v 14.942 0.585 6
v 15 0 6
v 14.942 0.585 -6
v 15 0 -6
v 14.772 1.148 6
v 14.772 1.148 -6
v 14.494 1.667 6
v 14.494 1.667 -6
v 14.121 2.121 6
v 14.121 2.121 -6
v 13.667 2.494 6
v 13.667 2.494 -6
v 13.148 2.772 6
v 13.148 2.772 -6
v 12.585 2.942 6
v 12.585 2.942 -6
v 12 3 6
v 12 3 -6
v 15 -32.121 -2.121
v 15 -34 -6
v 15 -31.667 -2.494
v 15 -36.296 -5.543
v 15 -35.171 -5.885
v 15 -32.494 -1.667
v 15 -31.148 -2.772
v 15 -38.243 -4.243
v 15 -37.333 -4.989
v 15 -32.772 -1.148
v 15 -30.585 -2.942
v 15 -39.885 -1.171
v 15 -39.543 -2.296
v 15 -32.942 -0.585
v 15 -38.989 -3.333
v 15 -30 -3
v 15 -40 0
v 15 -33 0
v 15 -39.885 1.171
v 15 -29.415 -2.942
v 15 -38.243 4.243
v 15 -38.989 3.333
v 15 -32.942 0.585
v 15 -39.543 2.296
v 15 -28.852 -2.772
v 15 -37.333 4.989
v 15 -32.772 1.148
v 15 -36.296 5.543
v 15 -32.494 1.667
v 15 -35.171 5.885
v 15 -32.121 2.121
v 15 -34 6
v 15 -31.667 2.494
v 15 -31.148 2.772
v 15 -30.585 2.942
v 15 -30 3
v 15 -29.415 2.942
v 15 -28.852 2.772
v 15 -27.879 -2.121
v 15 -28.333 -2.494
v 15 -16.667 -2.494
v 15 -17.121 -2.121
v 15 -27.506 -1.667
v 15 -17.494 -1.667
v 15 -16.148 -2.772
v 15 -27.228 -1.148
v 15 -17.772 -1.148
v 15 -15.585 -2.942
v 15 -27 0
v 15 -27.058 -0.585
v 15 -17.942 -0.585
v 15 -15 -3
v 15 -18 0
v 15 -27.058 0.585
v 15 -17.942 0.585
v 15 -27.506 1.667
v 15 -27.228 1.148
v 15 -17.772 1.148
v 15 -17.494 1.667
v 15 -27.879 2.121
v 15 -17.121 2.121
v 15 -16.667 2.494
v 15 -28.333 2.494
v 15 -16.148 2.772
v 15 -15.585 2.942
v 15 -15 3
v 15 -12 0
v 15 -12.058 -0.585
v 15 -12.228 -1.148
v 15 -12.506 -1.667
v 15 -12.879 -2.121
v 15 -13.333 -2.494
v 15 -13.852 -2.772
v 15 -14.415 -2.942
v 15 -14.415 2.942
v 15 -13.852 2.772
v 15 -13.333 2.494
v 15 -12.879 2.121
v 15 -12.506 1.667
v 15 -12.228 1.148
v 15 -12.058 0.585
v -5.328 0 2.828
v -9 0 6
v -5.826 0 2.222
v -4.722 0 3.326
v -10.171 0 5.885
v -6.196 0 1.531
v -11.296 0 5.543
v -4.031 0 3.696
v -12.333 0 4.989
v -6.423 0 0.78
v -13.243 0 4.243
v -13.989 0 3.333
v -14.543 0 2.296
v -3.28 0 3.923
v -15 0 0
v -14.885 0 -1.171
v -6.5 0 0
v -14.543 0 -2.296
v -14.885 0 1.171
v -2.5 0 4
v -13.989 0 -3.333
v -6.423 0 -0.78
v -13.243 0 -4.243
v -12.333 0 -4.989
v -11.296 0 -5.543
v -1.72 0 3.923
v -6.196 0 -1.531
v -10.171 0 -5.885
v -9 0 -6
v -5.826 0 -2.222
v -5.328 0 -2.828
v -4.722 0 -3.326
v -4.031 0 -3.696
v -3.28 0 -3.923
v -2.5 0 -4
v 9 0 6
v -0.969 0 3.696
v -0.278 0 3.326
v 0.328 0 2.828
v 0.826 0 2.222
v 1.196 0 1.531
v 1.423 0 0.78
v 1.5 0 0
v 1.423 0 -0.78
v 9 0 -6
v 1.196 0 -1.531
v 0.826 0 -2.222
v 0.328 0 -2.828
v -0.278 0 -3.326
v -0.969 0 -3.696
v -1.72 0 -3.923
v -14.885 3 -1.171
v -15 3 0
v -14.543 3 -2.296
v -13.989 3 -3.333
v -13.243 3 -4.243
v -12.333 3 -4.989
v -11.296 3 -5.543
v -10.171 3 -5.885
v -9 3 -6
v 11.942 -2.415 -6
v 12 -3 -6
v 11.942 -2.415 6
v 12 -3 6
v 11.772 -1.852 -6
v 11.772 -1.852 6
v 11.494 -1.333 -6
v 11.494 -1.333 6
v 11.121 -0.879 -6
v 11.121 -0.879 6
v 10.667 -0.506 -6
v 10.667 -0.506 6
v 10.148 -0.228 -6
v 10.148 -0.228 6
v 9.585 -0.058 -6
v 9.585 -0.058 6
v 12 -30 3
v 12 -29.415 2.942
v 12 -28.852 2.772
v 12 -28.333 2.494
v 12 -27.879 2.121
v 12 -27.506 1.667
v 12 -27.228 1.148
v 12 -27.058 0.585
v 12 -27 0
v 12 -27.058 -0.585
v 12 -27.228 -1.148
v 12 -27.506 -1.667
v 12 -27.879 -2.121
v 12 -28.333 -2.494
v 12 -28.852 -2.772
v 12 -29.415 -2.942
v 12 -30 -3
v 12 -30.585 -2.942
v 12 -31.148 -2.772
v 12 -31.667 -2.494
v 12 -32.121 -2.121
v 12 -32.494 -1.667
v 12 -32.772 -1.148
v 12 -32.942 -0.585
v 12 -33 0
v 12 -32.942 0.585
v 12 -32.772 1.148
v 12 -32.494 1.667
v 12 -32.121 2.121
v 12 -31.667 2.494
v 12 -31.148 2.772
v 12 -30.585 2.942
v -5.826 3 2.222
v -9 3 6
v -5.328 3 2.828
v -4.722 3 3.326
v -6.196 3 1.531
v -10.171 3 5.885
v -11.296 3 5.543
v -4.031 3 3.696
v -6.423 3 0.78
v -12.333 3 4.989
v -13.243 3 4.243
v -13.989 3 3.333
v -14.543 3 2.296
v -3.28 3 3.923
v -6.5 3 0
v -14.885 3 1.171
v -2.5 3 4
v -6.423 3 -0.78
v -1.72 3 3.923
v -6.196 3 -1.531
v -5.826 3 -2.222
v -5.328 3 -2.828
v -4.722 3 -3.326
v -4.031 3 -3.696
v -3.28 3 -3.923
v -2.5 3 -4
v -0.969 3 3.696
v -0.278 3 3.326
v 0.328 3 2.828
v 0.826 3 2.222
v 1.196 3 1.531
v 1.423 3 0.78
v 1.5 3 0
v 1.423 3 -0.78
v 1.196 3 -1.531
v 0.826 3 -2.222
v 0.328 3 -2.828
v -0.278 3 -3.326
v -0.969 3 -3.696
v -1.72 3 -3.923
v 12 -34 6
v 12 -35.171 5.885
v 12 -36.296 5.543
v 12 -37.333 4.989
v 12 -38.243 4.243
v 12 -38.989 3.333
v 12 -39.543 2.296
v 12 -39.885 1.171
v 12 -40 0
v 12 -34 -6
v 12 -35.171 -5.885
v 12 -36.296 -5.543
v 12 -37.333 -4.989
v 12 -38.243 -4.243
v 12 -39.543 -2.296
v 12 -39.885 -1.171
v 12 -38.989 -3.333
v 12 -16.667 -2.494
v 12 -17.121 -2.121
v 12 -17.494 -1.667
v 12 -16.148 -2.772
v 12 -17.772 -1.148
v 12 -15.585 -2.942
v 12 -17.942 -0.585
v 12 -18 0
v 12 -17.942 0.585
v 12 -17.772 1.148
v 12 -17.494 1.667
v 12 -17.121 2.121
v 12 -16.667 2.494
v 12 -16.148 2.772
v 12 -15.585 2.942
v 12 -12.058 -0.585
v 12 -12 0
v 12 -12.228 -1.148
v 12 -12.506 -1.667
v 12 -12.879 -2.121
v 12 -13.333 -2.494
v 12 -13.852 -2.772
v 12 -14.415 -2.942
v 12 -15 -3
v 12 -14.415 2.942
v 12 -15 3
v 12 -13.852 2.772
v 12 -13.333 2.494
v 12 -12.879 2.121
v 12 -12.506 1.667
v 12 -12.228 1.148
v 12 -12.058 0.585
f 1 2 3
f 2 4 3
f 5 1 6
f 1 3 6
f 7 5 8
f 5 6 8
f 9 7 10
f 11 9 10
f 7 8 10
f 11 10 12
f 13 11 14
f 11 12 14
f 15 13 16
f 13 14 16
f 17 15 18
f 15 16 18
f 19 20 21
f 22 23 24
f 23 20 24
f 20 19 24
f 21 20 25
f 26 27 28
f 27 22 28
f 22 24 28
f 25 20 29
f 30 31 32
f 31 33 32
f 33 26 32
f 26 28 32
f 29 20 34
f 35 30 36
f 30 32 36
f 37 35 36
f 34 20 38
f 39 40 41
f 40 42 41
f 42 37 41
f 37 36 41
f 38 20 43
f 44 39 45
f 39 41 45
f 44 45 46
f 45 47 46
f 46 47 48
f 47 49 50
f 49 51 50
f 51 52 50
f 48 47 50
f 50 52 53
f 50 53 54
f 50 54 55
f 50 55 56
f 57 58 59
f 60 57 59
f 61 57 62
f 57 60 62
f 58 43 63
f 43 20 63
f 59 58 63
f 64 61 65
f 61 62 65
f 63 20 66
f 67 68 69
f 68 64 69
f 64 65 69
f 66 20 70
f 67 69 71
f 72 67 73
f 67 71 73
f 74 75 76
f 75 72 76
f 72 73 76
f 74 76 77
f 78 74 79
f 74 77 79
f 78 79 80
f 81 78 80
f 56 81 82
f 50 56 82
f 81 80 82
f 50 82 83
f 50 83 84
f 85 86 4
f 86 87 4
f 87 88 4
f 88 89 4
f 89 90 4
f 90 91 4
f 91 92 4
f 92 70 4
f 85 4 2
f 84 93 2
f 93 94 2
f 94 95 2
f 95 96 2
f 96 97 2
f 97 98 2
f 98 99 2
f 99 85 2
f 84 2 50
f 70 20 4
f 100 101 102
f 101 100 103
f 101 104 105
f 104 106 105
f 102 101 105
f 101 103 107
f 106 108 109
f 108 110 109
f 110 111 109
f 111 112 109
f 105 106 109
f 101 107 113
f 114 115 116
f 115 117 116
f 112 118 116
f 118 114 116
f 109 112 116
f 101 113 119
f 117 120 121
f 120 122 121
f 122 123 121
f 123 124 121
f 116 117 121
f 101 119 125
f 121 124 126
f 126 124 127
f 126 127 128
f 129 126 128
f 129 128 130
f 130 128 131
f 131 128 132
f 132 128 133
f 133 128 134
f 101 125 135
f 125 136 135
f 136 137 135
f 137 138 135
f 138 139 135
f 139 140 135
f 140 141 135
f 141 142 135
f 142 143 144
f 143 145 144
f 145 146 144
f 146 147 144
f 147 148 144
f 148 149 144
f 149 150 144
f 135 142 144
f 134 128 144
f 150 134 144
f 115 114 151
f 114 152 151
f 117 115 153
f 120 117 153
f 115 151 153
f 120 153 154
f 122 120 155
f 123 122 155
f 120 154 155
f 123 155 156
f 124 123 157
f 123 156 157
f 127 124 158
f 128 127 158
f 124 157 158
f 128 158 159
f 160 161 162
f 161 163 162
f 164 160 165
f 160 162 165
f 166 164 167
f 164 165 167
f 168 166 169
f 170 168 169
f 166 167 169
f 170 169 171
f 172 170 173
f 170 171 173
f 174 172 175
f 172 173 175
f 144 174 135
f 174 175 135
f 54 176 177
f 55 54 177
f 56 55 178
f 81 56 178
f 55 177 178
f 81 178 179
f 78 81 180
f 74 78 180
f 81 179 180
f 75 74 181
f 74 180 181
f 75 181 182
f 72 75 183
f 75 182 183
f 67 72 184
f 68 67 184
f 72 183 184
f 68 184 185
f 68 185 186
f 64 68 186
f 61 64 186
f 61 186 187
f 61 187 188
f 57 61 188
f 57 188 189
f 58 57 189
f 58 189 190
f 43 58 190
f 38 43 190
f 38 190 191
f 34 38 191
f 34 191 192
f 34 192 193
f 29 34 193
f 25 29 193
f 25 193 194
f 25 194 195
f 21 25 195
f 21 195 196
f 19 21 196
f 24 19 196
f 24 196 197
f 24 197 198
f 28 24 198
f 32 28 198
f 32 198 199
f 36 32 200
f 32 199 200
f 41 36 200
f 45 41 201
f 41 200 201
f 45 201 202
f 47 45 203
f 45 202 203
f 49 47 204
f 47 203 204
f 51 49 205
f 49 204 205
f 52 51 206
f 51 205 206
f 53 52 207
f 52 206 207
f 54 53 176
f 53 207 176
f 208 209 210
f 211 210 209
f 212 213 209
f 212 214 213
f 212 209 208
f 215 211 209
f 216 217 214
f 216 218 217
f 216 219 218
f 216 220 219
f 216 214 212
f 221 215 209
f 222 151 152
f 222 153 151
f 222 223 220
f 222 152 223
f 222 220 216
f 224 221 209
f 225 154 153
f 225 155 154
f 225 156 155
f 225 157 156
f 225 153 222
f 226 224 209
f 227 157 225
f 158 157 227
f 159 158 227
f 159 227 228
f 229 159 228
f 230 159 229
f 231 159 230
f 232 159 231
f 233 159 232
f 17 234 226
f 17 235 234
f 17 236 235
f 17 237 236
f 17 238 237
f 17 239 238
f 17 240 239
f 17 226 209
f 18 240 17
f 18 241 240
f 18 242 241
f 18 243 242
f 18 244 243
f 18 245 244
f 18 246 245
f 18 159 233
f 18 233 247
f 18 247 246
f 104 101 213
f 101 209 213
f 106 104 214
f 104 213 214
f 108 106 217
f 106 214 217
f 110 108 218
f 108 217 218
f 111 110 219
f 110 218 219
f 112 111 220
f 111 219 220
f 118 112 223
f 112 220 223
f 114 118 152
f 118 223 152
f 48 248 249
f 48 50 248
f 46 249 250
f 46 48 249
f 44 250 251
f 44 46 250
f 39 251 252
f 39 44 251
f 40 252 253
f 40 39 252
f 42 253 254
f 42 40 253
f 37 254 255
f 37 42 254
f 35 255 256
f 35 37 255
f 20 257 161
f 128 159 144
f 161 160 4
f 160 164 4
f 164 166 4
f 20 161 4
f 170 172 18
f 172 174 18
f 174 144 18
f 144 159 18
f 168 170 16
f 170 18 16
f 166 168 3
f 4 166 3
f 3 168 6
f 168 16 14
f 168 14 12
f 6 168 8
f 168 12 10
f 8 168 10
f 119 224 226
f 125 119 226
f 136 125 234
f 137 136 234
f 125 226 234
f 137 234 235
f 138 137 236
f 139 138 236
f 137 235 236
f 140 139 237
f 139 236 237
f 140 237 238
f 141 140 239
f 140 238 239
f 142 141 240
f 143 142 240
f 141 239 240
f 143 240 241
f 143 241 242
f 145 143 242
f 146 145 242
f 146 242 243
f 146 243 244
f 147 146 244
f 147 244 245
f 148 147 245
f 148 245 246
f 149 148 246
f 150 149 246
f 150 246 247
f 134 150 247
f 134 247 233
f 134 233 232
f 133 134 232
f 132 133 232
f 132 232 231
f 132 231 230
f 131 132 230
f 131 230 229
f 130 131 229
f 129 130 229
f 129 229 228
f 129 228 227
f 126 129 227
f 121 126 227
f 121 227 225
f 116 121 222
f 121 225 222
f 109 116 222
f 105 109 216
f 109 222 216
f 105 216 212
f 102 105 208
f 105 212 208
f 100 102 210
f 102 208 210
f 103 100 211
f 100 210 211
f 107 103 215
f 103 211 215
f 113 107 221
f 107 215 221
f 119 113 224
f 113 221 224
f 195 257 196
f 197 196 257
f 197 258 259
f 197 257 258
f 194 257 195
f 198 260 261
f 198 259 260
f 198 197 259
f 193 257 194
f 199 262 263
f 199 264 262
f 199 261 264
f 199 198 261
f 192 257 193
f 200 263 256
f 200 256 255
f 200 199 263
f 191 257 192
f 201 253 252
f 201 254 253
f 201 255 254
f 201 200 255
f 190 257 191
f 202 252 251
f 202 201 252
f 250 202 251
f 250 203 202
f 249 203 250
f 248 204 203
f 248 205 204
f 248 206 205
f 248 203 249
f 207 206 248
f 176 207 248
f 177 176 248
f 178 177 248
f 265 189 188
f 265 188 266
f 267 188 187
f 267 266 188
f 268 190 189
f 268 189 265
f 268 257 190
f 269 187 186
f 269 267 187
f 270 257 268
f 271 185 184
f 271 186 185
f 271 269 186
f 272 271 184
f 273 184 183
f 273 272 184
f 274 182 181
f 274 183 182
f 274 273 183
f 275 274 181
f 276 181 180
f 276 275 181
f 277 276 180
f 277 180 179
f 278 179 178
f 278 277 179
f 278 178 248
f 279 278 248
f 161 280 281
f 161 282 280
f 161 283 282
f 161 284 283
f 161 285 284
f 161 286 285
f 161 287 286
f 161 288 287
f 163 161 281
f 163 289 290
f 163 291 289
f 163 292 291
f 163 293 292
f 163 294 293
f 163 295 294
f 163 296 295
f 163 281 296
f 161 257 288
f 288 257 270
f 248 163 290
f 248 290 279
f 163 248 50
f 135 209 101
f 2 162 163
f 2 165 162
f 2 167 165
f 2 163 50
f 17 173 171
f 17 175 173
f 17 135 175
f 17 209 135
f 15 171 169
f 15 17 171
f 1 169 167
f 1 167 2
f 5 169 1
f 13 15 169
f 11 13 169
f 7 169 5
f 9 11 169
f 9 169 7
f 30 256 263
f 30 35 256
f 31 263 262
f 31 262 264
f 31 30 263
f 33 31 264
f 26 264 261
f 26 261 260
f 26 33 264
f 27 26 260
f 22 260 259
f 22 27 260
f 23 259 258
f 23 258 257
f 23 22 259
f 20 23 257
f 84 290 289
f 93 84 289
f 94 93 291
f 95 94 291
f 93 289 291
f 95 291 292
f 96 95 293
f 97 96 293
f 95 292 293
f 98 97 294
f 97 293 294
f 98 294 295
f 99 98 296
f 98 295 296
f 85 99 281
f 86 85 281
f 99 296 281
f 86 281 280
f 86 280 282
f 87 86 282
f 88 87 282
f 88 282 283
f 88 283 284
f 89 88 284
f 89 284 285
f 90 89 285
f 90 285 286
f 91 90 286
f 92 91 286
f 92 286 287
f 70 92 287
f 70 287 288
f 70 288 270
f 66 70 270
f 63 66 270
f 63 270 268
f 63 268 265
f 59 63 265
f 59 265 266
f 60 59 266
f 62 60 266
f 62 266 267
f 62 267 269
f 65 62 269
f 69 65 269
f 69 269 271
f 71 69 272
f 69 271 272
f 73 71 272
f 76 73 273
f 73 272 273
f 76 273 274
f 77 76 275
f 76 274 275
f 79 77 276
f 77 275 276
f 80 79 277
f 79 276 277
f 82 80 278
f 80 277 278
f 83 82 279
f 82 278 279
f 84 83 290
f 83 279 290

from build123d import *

# Parameters (mm, degrees)
SKETCH1_W           = 30
SKETCH1_H           = 12
BOSS_EXTRUDE1_DEPTH = 3
SKETCH2_W           = 3
SKETCH2_H           = 12
BOSS_EXTRUDE2_DEPTH = 40
FILLET1_R           = 3
FILLET2_R           = 3
SKETCH3_R           = 4
CUT_EXTRUDE1_DEPTH  = 40
SKETCH4_R           = 3
CUT_EXTRUDE3_DEPTH  = 49.631265663
FILLET3_R           = 6
FILLET4_R           = 6


with BuildPart() as part:
    # Sketch1 → Boss-Extrude1 (new body)
    with BuildSketch(Plane(origin=(0, 0, 0), x_dir=(1, 0, 0), z_dir=(0, 1, 0))):
        Rectangle(SKETCH1_W, SKETCH1_H)
    extrude(amount=BOSS_EXTRUDE1_DEPTH)

    # Sketch2 → Boss-Extrude2 (add)
    with BuildSketch(Plane.XZ):
        with Locations((13.5, 0)):
            Rectangle(SKETCH2_W, SKETCH2_H)
    extrude(amount=BOSS_EXTRUDE2_DEPTH)

    # Fillet1
    fillet1_edges = [part.edges().sort_by_distance(p)[0] for p in [
        (15, 3, 0),
    ]]
    fillet(fillet1_edges, radius=FILLET1_R)

    # Fillet2
    fillet2_edges = [part.edges().sort_by_distance(p)[0] for p in [
        (12, 0, 0),
    ]]
    fillet(fillet2_edges, radius=FILLET2_R)

    # Sketch3 → Cut-Extrude1 (cut)
    with BuildSketch(Plane(origin=(0, 3, 0), x_dir=(1, 0, 0), z_dir=(0, 1, 0))):
        with Locations(Location((-2.5, 0, 0), (0, 0, 270))):
            Circle(SKETCH3_R)
    extrude(amount=-CUT_EXTRUDE1_DEPTH, mode=Mode.SUBTRACT)

    # Sketch4 → Cut-Extrude3 (cut, through all)
    with BuildSketch(Plane.ZY.offset(-12)):
        with Locations((0, -15)):
            Circle(SKETCH4_R)
        with Locations((0, -30)):
            Circle(SKETCH4_R)
    extrude(amount=-CUT_EXTRUDE3_DEPTH, mode=Mode.SUBTRACT)

    # Fillet3
    fillet3_edges = [part.edges().sort_by_distance(p)[0] for p in [
        (-15, 1.5, -6),
        (-15, 1.5, 6),
    ]]
    fillet(fillet3_edges, radius=FILLET3_R - 0.0001)  # a hair under: the kernel refuses the full size

    # Fillet4
    fillet4_edges = [part.edges().sort_by_distance(p)[0] for p in [
        (13.5, -40, 6),
        (13.5, -40, -6),
    ]]
    fillet(fillet4_edges, radius=FILLET4_R - 0.0001)  # a hair under: the kernel refuses the full size


solid = part.part
